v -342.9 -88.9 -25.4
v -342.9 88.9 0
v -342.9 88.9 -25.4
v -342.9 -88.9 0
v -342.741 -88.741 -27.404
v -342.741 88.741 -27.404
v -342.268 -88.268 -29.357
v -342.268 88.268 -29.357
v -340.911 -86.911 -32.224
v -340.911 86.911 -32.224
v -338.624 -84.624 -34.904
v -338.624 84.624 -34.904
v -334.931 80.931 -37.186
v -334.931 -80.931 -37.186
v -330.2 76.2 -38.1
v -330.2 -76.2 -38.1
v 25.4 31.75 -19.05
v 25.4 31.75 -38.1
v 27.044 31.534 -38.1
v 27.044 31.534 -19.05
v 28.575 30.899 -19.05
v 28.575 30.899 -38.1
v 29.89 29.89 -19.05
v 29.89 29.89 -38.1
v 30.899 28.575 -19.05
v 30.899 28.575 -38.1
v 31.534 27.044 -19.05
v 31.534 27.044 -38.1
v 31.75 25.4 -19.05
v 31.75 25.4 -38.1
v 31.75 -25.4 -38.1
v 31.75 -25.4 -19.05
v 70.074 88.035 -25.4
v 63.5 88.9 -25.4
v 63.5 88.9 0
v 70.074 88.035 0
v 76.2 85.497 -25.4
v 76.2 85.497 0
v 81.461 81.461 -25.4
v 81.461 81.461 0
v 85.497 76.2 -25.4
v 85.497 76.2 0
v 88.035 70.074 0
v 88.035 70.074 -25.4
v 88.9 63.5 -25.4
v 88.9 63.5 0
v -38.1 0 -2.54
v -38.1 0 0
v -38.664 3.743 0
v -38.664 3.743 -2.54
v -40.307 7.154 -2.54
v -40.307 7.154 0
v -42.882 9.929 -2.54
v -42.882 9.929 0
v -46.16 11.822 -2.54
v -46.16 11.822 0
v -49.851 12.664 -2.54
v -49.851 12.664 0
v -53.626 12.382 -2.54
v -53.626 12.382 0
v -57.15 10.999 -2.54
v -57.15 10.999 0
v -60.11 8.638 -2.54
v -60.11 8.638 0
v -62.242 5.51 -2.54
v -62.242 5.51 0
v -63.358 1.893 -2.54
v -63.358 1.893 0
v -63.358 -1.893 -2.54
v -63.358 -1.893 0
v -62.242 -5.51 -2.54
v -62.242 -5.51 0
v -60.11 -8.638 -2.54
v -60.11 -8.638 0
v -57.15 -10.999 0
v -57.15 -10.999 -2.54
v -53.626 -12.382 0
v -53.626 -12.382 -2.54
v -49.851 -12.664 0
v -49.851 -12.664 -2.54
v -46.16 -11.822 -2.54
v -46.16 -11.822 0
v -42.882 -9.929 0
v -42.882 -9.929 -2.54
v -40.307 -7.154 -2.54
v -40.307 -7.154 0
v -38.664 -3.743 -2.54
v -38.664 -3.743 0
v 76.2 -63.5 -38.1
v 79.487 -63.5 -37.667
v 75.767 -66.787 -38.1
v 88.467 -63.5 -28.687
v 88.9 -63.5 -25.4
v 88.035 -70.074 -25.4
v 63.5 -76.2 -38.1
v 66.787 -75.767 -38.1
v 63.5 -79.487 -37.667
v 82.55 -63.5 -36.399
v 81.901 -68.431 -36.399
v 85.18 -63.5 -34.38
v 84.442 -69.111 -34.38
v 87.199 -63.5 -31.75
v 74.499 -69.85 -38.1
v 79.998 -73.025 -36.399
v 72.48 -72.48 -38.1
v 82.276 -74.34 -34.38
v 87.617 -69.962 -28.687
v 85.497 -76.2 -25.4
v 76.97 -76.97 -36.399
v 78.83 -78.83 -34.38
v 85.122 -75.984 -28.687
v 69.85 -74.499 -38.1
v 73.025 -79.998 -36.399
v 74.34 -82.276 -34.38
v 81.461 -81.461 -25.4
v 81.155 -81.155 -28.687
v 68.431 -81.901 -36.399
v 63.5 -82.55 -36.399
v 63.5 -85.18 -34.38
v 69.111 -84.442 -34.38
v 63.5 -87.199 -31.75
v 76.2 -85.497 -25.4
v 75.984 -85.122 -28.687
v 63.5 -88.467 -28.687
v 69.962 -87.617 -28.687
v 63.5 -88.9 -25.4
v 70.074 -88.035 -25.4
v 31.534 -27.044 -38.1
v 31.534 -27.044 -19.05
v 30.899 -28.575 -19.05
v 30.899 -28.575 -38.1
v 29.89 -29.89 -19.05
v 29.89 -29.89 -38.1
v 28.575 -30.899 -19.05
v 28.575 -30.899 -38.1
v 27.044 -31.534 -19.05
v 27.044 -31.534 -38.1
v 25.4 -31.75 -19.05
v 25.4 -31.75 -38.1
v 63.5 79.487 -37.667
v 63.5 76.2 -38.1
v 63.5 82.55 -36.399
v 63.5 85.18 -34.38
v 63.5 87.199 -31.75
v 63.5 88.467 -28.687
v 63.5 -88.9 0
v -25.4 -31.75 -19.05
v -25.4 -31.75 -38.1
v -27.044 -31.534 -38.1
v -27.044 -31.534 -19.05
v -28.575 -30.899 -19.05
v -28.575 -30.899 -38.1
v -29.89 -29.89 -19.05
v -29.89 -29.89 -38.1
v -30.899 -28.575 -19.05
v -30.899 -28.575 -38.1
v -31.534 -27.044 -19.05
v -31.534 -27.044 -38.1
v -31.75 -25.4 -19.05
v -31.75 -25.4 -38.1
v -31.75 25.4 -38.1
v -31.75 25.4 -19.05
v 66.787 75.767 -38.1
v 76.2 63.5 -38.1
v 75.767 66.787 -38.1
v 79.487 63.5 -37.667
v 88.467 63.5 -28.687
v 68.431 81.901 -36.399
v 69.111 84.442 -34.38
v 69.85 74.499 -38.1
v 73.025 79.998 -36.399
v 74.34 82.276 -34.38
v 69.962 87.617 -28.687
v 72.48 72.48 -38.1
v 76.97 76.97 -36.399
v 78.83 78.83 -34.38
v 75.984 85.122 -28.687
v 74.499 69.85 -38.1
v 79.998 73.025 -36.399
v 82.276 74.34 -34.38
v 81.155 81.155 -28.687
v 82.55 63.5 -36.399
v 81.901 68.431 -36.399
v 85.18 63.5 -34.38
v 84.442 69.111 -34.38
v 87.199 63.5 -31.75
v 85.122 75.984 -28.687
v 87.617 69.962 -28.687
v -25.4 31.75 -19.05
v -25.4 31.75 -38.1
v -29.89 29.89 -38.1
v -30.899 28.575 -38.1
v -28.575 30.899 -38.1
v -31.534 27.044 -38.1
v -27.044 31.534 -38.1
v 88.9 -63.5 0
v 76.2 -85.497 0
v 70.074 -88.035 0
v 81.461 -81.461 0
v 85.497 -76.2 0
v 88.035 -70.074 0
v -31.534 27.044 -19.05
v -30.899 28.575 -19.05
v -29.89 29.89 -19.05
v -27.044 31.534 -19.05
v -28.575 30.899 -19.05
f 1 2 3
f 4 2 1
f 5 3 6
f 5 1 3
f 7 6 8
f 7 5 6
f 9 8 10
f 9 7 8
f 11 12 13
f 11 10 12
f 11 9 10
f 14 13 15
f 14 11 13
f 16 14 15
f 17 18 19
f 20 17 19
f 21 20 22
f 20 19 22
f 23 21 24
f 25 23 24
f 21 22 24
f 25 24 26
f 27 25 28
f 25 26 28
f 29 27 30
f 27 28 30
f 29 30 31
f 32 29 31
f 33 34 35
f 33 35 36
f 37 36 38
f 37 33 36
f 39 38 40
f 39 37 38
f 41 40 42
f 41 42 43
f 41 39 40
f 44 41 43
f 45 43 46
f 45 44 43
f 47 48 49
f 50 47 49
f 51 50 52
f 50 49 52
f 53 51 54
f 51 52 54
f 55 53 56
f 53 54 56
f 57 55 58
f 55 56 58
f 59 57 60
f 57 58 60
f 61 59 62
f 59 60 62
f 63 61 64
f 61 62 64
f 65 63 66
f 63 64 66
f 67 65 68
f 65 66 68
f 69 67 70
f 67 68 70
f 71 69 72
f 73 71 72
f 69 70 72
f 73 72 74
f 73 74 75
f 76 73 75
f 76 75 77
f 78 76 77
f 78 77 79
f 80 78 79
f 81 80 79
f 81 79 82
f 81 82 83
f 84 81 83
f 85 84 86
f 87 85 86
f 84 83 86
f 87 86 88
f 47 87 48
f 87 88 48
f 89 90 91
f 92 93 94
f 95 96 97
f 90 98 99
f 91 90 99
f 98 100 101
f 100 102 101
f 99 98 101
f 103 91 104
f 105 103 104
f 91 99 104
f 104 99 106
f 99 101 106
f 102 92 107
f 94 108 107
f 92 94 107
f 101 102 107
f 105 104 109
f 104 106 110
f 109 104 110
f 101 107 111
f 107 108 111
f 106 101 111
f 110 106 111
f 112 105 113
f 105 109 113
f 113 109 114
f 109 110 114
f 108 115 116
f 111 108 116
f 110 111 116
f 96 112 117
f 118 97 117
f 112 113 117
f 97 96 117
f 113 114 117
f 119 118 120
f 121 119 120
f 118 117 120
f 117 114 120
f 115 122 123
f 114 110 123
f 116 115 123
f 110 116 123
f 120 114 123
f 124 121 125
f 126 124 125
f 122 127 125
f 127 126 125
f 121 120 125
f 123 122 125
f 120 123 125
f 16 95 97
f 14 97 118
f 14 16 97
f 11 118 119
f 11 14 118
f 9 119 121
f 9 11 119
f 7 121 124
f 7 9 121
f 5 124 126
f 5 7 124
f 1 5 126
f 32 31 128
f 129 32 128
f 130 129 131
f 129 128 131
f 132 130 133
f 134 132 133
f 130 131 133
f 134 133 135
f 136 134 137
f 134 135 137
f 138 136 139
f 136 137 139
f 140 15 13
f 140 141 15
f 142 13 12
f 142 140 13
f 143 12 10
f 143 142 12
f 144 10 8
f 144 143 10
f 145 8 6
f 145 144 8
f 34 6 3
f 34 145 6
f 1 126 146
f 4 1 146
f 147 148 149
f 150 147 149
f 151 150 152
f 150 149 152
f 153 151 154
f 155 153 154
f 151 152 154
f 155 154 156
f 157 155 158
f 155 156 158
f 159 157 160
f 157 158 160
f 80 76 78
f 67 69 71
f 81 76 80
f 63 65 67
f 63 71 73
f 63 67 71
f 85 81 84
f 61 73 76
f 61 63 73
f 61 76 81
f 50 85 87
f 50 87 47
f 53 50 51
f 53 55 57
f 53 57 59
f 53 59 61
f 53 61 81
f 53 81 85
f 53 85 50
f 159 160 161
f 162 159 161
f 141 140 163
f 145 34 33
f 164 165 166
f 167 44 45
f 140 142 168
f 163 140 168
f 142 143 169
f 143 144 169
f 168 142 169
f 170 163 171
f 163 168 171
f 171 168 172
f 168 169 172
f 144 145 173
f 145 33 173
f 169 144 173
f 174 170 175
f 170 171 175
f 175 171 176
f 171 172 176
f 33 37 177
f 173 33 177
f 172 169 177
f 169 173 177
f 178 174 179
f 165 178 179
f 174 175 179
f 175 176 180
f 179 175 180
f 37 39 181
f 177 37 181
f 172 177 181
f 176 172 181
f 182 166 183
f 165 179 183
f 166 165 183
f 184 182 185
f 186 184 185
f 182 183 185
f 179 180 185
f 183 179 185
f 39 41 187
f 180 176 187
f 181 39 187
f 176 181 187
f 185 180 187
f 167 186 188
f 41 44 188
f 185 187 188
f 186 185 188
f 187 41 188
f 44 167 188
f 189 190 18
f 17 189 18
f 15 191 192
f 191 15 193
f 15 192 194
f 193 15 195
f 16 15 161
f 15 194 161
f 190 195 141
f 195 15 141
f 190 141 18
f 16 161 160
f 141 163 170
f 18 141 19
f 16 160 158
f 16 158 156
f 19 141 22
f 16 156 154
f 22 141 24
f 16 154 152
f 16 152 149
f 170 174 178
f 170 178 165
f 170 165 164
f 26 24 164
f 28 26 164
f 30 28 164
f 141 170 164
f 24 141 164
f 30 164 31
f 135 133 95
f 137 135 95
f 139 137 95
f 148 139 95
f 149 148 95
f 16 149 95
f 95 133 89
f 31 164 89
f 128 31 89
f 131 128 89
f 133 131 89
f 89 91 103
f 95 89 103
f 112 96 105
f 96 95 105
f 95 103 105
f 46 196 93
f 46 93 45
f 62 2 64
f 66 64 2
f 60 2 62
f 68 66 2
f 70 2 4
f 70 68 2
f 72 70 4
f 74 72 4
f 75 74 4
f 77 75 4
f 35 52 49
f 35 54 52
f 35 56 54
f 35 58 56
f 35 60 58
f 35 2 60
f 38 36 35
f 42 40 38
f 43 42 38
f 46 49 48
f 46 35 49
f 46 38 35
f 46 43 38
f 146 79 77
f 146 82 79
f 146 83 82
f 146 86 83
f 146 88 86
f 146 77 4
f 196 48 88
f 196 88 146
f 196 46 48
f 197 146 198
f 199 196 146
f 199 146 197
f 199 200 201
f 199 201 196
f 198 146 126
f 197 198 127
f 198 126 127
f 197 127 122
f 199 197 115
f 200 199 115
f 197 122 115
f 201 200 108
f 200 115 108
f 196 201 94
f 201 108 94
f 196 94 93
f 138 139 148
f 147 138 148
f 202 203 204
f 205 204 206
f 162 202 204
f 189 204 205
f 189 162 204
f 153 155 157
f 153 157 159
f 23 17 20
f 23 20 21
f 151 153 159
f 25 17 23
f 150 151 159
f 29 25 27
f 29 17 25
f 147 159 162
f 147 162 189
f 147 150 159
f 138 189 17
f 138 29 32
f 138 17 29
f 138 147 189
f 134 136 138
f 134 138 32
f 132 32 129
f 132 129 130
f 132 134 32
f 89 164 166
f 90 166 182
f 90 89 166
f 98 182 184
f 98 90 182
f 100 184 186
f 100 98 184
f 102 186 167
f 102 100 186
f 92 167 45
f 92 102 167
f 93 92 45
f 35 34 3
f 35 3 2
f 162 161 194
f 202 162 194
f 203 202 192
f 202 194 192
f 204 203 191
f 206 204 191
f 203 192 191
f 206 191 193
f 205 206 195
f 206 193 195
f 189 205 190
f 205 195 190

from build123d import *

# Parameters (mm, degrees)
F0_W     = 177.8
F0_H     = 177.8
F1_DEPTH = 38.1
F2_W     = 177.8
F2_H     = 38.1
F3_DEPTH = 254
F4_R     = 25.4
F5_R     = 12.7
F7_DEPTH = 19.05
F8_R     = 12.7
F9_DEPTH = 2.54


with BuildPart() as f1:
    # F0 (on Top) → F1 (new body)
    with BuildSketch(Plane.XY):
        Rectangle(F0_W, F0_H)
    extrude(amount=-F1_DEPTH)

    # F2 (on face) → F3 (join)
    with BuildSketch(Plane(origin=(-88.9, 0, 0), x_dir=(0, -1, 0), z_dir=(-1, 0, 0))):
        with Locations((0, -19.05)):
            Rectangle(F2_W, F2_H)
    extrude(amount=F3_DEPTH)

    # F4
    f4_edges = [f1.edges().sort_by_distance(p)[0] for p in [
        (88.9, 88.9, -19.05),
        (88.9, -88.9, -19.05),
    ]]
    fillet(f4_edges, radius=F4_R)

    # F5
    f5_edges = [f1.edges().sort_by_distance(p)[0] for p in [
        (-139.7, -88.9, -38.1),
        (-342.9, 0, -38.1),
        (-139.7, 88.9, -38.1),
        (81.460512, 81.460512, -38.1),
        (88.9, 0, -38.1),
        (81.460512, -81.460512, -38.1),
    ]]
    fillet(f5_edges, radius=F5_R)

    # F6 (on face) → F7 (cut)
    with BuildSketch(Plane(origin=(0, 0, -38.1), x_dir=(1, 0, 0), z_dir=(0, 0, -1))):
        with BuildLine():
            Line((-25.4, -31.75), (25.4, -31.75))
            ThreePointArc((25.4, -31.75), (29.8901280605, -29.8901280605), (31.75, -25.4))
            Line((31.75, -25.4), (31.75, 25.4))
            ThreePointArc((31.75, 25.4), (29.8901280605, 29.8901280605), (25.4, 31.75))
            Line((25.4, 31.75), (-25.4, 31.75))
            ThreePointArc((-25.4, 31.75), (-29.8901280605, 29.8901280605), (-31.75, 25.4))
            Line((-31.75, 25.4), (-31.75, -25.4))
            ThreePointArc((-31.75, -25.4), (-29.8901280605, -29.8901280605), (-25.4, -31.75))
        make_face()
    extrude(amount=-F7_DEPTH, mode=Mode.SUBTRACT)

    # F8 (on face) → F9 (cut)
    with BuildSketch(Plane.XY):
        with Locations((-50.8, 0)):
            Circle(F8_R)
    extrude(amount=-F9_DEPTH, mode=Mode.SUBTRACT)


solid = f1.part
